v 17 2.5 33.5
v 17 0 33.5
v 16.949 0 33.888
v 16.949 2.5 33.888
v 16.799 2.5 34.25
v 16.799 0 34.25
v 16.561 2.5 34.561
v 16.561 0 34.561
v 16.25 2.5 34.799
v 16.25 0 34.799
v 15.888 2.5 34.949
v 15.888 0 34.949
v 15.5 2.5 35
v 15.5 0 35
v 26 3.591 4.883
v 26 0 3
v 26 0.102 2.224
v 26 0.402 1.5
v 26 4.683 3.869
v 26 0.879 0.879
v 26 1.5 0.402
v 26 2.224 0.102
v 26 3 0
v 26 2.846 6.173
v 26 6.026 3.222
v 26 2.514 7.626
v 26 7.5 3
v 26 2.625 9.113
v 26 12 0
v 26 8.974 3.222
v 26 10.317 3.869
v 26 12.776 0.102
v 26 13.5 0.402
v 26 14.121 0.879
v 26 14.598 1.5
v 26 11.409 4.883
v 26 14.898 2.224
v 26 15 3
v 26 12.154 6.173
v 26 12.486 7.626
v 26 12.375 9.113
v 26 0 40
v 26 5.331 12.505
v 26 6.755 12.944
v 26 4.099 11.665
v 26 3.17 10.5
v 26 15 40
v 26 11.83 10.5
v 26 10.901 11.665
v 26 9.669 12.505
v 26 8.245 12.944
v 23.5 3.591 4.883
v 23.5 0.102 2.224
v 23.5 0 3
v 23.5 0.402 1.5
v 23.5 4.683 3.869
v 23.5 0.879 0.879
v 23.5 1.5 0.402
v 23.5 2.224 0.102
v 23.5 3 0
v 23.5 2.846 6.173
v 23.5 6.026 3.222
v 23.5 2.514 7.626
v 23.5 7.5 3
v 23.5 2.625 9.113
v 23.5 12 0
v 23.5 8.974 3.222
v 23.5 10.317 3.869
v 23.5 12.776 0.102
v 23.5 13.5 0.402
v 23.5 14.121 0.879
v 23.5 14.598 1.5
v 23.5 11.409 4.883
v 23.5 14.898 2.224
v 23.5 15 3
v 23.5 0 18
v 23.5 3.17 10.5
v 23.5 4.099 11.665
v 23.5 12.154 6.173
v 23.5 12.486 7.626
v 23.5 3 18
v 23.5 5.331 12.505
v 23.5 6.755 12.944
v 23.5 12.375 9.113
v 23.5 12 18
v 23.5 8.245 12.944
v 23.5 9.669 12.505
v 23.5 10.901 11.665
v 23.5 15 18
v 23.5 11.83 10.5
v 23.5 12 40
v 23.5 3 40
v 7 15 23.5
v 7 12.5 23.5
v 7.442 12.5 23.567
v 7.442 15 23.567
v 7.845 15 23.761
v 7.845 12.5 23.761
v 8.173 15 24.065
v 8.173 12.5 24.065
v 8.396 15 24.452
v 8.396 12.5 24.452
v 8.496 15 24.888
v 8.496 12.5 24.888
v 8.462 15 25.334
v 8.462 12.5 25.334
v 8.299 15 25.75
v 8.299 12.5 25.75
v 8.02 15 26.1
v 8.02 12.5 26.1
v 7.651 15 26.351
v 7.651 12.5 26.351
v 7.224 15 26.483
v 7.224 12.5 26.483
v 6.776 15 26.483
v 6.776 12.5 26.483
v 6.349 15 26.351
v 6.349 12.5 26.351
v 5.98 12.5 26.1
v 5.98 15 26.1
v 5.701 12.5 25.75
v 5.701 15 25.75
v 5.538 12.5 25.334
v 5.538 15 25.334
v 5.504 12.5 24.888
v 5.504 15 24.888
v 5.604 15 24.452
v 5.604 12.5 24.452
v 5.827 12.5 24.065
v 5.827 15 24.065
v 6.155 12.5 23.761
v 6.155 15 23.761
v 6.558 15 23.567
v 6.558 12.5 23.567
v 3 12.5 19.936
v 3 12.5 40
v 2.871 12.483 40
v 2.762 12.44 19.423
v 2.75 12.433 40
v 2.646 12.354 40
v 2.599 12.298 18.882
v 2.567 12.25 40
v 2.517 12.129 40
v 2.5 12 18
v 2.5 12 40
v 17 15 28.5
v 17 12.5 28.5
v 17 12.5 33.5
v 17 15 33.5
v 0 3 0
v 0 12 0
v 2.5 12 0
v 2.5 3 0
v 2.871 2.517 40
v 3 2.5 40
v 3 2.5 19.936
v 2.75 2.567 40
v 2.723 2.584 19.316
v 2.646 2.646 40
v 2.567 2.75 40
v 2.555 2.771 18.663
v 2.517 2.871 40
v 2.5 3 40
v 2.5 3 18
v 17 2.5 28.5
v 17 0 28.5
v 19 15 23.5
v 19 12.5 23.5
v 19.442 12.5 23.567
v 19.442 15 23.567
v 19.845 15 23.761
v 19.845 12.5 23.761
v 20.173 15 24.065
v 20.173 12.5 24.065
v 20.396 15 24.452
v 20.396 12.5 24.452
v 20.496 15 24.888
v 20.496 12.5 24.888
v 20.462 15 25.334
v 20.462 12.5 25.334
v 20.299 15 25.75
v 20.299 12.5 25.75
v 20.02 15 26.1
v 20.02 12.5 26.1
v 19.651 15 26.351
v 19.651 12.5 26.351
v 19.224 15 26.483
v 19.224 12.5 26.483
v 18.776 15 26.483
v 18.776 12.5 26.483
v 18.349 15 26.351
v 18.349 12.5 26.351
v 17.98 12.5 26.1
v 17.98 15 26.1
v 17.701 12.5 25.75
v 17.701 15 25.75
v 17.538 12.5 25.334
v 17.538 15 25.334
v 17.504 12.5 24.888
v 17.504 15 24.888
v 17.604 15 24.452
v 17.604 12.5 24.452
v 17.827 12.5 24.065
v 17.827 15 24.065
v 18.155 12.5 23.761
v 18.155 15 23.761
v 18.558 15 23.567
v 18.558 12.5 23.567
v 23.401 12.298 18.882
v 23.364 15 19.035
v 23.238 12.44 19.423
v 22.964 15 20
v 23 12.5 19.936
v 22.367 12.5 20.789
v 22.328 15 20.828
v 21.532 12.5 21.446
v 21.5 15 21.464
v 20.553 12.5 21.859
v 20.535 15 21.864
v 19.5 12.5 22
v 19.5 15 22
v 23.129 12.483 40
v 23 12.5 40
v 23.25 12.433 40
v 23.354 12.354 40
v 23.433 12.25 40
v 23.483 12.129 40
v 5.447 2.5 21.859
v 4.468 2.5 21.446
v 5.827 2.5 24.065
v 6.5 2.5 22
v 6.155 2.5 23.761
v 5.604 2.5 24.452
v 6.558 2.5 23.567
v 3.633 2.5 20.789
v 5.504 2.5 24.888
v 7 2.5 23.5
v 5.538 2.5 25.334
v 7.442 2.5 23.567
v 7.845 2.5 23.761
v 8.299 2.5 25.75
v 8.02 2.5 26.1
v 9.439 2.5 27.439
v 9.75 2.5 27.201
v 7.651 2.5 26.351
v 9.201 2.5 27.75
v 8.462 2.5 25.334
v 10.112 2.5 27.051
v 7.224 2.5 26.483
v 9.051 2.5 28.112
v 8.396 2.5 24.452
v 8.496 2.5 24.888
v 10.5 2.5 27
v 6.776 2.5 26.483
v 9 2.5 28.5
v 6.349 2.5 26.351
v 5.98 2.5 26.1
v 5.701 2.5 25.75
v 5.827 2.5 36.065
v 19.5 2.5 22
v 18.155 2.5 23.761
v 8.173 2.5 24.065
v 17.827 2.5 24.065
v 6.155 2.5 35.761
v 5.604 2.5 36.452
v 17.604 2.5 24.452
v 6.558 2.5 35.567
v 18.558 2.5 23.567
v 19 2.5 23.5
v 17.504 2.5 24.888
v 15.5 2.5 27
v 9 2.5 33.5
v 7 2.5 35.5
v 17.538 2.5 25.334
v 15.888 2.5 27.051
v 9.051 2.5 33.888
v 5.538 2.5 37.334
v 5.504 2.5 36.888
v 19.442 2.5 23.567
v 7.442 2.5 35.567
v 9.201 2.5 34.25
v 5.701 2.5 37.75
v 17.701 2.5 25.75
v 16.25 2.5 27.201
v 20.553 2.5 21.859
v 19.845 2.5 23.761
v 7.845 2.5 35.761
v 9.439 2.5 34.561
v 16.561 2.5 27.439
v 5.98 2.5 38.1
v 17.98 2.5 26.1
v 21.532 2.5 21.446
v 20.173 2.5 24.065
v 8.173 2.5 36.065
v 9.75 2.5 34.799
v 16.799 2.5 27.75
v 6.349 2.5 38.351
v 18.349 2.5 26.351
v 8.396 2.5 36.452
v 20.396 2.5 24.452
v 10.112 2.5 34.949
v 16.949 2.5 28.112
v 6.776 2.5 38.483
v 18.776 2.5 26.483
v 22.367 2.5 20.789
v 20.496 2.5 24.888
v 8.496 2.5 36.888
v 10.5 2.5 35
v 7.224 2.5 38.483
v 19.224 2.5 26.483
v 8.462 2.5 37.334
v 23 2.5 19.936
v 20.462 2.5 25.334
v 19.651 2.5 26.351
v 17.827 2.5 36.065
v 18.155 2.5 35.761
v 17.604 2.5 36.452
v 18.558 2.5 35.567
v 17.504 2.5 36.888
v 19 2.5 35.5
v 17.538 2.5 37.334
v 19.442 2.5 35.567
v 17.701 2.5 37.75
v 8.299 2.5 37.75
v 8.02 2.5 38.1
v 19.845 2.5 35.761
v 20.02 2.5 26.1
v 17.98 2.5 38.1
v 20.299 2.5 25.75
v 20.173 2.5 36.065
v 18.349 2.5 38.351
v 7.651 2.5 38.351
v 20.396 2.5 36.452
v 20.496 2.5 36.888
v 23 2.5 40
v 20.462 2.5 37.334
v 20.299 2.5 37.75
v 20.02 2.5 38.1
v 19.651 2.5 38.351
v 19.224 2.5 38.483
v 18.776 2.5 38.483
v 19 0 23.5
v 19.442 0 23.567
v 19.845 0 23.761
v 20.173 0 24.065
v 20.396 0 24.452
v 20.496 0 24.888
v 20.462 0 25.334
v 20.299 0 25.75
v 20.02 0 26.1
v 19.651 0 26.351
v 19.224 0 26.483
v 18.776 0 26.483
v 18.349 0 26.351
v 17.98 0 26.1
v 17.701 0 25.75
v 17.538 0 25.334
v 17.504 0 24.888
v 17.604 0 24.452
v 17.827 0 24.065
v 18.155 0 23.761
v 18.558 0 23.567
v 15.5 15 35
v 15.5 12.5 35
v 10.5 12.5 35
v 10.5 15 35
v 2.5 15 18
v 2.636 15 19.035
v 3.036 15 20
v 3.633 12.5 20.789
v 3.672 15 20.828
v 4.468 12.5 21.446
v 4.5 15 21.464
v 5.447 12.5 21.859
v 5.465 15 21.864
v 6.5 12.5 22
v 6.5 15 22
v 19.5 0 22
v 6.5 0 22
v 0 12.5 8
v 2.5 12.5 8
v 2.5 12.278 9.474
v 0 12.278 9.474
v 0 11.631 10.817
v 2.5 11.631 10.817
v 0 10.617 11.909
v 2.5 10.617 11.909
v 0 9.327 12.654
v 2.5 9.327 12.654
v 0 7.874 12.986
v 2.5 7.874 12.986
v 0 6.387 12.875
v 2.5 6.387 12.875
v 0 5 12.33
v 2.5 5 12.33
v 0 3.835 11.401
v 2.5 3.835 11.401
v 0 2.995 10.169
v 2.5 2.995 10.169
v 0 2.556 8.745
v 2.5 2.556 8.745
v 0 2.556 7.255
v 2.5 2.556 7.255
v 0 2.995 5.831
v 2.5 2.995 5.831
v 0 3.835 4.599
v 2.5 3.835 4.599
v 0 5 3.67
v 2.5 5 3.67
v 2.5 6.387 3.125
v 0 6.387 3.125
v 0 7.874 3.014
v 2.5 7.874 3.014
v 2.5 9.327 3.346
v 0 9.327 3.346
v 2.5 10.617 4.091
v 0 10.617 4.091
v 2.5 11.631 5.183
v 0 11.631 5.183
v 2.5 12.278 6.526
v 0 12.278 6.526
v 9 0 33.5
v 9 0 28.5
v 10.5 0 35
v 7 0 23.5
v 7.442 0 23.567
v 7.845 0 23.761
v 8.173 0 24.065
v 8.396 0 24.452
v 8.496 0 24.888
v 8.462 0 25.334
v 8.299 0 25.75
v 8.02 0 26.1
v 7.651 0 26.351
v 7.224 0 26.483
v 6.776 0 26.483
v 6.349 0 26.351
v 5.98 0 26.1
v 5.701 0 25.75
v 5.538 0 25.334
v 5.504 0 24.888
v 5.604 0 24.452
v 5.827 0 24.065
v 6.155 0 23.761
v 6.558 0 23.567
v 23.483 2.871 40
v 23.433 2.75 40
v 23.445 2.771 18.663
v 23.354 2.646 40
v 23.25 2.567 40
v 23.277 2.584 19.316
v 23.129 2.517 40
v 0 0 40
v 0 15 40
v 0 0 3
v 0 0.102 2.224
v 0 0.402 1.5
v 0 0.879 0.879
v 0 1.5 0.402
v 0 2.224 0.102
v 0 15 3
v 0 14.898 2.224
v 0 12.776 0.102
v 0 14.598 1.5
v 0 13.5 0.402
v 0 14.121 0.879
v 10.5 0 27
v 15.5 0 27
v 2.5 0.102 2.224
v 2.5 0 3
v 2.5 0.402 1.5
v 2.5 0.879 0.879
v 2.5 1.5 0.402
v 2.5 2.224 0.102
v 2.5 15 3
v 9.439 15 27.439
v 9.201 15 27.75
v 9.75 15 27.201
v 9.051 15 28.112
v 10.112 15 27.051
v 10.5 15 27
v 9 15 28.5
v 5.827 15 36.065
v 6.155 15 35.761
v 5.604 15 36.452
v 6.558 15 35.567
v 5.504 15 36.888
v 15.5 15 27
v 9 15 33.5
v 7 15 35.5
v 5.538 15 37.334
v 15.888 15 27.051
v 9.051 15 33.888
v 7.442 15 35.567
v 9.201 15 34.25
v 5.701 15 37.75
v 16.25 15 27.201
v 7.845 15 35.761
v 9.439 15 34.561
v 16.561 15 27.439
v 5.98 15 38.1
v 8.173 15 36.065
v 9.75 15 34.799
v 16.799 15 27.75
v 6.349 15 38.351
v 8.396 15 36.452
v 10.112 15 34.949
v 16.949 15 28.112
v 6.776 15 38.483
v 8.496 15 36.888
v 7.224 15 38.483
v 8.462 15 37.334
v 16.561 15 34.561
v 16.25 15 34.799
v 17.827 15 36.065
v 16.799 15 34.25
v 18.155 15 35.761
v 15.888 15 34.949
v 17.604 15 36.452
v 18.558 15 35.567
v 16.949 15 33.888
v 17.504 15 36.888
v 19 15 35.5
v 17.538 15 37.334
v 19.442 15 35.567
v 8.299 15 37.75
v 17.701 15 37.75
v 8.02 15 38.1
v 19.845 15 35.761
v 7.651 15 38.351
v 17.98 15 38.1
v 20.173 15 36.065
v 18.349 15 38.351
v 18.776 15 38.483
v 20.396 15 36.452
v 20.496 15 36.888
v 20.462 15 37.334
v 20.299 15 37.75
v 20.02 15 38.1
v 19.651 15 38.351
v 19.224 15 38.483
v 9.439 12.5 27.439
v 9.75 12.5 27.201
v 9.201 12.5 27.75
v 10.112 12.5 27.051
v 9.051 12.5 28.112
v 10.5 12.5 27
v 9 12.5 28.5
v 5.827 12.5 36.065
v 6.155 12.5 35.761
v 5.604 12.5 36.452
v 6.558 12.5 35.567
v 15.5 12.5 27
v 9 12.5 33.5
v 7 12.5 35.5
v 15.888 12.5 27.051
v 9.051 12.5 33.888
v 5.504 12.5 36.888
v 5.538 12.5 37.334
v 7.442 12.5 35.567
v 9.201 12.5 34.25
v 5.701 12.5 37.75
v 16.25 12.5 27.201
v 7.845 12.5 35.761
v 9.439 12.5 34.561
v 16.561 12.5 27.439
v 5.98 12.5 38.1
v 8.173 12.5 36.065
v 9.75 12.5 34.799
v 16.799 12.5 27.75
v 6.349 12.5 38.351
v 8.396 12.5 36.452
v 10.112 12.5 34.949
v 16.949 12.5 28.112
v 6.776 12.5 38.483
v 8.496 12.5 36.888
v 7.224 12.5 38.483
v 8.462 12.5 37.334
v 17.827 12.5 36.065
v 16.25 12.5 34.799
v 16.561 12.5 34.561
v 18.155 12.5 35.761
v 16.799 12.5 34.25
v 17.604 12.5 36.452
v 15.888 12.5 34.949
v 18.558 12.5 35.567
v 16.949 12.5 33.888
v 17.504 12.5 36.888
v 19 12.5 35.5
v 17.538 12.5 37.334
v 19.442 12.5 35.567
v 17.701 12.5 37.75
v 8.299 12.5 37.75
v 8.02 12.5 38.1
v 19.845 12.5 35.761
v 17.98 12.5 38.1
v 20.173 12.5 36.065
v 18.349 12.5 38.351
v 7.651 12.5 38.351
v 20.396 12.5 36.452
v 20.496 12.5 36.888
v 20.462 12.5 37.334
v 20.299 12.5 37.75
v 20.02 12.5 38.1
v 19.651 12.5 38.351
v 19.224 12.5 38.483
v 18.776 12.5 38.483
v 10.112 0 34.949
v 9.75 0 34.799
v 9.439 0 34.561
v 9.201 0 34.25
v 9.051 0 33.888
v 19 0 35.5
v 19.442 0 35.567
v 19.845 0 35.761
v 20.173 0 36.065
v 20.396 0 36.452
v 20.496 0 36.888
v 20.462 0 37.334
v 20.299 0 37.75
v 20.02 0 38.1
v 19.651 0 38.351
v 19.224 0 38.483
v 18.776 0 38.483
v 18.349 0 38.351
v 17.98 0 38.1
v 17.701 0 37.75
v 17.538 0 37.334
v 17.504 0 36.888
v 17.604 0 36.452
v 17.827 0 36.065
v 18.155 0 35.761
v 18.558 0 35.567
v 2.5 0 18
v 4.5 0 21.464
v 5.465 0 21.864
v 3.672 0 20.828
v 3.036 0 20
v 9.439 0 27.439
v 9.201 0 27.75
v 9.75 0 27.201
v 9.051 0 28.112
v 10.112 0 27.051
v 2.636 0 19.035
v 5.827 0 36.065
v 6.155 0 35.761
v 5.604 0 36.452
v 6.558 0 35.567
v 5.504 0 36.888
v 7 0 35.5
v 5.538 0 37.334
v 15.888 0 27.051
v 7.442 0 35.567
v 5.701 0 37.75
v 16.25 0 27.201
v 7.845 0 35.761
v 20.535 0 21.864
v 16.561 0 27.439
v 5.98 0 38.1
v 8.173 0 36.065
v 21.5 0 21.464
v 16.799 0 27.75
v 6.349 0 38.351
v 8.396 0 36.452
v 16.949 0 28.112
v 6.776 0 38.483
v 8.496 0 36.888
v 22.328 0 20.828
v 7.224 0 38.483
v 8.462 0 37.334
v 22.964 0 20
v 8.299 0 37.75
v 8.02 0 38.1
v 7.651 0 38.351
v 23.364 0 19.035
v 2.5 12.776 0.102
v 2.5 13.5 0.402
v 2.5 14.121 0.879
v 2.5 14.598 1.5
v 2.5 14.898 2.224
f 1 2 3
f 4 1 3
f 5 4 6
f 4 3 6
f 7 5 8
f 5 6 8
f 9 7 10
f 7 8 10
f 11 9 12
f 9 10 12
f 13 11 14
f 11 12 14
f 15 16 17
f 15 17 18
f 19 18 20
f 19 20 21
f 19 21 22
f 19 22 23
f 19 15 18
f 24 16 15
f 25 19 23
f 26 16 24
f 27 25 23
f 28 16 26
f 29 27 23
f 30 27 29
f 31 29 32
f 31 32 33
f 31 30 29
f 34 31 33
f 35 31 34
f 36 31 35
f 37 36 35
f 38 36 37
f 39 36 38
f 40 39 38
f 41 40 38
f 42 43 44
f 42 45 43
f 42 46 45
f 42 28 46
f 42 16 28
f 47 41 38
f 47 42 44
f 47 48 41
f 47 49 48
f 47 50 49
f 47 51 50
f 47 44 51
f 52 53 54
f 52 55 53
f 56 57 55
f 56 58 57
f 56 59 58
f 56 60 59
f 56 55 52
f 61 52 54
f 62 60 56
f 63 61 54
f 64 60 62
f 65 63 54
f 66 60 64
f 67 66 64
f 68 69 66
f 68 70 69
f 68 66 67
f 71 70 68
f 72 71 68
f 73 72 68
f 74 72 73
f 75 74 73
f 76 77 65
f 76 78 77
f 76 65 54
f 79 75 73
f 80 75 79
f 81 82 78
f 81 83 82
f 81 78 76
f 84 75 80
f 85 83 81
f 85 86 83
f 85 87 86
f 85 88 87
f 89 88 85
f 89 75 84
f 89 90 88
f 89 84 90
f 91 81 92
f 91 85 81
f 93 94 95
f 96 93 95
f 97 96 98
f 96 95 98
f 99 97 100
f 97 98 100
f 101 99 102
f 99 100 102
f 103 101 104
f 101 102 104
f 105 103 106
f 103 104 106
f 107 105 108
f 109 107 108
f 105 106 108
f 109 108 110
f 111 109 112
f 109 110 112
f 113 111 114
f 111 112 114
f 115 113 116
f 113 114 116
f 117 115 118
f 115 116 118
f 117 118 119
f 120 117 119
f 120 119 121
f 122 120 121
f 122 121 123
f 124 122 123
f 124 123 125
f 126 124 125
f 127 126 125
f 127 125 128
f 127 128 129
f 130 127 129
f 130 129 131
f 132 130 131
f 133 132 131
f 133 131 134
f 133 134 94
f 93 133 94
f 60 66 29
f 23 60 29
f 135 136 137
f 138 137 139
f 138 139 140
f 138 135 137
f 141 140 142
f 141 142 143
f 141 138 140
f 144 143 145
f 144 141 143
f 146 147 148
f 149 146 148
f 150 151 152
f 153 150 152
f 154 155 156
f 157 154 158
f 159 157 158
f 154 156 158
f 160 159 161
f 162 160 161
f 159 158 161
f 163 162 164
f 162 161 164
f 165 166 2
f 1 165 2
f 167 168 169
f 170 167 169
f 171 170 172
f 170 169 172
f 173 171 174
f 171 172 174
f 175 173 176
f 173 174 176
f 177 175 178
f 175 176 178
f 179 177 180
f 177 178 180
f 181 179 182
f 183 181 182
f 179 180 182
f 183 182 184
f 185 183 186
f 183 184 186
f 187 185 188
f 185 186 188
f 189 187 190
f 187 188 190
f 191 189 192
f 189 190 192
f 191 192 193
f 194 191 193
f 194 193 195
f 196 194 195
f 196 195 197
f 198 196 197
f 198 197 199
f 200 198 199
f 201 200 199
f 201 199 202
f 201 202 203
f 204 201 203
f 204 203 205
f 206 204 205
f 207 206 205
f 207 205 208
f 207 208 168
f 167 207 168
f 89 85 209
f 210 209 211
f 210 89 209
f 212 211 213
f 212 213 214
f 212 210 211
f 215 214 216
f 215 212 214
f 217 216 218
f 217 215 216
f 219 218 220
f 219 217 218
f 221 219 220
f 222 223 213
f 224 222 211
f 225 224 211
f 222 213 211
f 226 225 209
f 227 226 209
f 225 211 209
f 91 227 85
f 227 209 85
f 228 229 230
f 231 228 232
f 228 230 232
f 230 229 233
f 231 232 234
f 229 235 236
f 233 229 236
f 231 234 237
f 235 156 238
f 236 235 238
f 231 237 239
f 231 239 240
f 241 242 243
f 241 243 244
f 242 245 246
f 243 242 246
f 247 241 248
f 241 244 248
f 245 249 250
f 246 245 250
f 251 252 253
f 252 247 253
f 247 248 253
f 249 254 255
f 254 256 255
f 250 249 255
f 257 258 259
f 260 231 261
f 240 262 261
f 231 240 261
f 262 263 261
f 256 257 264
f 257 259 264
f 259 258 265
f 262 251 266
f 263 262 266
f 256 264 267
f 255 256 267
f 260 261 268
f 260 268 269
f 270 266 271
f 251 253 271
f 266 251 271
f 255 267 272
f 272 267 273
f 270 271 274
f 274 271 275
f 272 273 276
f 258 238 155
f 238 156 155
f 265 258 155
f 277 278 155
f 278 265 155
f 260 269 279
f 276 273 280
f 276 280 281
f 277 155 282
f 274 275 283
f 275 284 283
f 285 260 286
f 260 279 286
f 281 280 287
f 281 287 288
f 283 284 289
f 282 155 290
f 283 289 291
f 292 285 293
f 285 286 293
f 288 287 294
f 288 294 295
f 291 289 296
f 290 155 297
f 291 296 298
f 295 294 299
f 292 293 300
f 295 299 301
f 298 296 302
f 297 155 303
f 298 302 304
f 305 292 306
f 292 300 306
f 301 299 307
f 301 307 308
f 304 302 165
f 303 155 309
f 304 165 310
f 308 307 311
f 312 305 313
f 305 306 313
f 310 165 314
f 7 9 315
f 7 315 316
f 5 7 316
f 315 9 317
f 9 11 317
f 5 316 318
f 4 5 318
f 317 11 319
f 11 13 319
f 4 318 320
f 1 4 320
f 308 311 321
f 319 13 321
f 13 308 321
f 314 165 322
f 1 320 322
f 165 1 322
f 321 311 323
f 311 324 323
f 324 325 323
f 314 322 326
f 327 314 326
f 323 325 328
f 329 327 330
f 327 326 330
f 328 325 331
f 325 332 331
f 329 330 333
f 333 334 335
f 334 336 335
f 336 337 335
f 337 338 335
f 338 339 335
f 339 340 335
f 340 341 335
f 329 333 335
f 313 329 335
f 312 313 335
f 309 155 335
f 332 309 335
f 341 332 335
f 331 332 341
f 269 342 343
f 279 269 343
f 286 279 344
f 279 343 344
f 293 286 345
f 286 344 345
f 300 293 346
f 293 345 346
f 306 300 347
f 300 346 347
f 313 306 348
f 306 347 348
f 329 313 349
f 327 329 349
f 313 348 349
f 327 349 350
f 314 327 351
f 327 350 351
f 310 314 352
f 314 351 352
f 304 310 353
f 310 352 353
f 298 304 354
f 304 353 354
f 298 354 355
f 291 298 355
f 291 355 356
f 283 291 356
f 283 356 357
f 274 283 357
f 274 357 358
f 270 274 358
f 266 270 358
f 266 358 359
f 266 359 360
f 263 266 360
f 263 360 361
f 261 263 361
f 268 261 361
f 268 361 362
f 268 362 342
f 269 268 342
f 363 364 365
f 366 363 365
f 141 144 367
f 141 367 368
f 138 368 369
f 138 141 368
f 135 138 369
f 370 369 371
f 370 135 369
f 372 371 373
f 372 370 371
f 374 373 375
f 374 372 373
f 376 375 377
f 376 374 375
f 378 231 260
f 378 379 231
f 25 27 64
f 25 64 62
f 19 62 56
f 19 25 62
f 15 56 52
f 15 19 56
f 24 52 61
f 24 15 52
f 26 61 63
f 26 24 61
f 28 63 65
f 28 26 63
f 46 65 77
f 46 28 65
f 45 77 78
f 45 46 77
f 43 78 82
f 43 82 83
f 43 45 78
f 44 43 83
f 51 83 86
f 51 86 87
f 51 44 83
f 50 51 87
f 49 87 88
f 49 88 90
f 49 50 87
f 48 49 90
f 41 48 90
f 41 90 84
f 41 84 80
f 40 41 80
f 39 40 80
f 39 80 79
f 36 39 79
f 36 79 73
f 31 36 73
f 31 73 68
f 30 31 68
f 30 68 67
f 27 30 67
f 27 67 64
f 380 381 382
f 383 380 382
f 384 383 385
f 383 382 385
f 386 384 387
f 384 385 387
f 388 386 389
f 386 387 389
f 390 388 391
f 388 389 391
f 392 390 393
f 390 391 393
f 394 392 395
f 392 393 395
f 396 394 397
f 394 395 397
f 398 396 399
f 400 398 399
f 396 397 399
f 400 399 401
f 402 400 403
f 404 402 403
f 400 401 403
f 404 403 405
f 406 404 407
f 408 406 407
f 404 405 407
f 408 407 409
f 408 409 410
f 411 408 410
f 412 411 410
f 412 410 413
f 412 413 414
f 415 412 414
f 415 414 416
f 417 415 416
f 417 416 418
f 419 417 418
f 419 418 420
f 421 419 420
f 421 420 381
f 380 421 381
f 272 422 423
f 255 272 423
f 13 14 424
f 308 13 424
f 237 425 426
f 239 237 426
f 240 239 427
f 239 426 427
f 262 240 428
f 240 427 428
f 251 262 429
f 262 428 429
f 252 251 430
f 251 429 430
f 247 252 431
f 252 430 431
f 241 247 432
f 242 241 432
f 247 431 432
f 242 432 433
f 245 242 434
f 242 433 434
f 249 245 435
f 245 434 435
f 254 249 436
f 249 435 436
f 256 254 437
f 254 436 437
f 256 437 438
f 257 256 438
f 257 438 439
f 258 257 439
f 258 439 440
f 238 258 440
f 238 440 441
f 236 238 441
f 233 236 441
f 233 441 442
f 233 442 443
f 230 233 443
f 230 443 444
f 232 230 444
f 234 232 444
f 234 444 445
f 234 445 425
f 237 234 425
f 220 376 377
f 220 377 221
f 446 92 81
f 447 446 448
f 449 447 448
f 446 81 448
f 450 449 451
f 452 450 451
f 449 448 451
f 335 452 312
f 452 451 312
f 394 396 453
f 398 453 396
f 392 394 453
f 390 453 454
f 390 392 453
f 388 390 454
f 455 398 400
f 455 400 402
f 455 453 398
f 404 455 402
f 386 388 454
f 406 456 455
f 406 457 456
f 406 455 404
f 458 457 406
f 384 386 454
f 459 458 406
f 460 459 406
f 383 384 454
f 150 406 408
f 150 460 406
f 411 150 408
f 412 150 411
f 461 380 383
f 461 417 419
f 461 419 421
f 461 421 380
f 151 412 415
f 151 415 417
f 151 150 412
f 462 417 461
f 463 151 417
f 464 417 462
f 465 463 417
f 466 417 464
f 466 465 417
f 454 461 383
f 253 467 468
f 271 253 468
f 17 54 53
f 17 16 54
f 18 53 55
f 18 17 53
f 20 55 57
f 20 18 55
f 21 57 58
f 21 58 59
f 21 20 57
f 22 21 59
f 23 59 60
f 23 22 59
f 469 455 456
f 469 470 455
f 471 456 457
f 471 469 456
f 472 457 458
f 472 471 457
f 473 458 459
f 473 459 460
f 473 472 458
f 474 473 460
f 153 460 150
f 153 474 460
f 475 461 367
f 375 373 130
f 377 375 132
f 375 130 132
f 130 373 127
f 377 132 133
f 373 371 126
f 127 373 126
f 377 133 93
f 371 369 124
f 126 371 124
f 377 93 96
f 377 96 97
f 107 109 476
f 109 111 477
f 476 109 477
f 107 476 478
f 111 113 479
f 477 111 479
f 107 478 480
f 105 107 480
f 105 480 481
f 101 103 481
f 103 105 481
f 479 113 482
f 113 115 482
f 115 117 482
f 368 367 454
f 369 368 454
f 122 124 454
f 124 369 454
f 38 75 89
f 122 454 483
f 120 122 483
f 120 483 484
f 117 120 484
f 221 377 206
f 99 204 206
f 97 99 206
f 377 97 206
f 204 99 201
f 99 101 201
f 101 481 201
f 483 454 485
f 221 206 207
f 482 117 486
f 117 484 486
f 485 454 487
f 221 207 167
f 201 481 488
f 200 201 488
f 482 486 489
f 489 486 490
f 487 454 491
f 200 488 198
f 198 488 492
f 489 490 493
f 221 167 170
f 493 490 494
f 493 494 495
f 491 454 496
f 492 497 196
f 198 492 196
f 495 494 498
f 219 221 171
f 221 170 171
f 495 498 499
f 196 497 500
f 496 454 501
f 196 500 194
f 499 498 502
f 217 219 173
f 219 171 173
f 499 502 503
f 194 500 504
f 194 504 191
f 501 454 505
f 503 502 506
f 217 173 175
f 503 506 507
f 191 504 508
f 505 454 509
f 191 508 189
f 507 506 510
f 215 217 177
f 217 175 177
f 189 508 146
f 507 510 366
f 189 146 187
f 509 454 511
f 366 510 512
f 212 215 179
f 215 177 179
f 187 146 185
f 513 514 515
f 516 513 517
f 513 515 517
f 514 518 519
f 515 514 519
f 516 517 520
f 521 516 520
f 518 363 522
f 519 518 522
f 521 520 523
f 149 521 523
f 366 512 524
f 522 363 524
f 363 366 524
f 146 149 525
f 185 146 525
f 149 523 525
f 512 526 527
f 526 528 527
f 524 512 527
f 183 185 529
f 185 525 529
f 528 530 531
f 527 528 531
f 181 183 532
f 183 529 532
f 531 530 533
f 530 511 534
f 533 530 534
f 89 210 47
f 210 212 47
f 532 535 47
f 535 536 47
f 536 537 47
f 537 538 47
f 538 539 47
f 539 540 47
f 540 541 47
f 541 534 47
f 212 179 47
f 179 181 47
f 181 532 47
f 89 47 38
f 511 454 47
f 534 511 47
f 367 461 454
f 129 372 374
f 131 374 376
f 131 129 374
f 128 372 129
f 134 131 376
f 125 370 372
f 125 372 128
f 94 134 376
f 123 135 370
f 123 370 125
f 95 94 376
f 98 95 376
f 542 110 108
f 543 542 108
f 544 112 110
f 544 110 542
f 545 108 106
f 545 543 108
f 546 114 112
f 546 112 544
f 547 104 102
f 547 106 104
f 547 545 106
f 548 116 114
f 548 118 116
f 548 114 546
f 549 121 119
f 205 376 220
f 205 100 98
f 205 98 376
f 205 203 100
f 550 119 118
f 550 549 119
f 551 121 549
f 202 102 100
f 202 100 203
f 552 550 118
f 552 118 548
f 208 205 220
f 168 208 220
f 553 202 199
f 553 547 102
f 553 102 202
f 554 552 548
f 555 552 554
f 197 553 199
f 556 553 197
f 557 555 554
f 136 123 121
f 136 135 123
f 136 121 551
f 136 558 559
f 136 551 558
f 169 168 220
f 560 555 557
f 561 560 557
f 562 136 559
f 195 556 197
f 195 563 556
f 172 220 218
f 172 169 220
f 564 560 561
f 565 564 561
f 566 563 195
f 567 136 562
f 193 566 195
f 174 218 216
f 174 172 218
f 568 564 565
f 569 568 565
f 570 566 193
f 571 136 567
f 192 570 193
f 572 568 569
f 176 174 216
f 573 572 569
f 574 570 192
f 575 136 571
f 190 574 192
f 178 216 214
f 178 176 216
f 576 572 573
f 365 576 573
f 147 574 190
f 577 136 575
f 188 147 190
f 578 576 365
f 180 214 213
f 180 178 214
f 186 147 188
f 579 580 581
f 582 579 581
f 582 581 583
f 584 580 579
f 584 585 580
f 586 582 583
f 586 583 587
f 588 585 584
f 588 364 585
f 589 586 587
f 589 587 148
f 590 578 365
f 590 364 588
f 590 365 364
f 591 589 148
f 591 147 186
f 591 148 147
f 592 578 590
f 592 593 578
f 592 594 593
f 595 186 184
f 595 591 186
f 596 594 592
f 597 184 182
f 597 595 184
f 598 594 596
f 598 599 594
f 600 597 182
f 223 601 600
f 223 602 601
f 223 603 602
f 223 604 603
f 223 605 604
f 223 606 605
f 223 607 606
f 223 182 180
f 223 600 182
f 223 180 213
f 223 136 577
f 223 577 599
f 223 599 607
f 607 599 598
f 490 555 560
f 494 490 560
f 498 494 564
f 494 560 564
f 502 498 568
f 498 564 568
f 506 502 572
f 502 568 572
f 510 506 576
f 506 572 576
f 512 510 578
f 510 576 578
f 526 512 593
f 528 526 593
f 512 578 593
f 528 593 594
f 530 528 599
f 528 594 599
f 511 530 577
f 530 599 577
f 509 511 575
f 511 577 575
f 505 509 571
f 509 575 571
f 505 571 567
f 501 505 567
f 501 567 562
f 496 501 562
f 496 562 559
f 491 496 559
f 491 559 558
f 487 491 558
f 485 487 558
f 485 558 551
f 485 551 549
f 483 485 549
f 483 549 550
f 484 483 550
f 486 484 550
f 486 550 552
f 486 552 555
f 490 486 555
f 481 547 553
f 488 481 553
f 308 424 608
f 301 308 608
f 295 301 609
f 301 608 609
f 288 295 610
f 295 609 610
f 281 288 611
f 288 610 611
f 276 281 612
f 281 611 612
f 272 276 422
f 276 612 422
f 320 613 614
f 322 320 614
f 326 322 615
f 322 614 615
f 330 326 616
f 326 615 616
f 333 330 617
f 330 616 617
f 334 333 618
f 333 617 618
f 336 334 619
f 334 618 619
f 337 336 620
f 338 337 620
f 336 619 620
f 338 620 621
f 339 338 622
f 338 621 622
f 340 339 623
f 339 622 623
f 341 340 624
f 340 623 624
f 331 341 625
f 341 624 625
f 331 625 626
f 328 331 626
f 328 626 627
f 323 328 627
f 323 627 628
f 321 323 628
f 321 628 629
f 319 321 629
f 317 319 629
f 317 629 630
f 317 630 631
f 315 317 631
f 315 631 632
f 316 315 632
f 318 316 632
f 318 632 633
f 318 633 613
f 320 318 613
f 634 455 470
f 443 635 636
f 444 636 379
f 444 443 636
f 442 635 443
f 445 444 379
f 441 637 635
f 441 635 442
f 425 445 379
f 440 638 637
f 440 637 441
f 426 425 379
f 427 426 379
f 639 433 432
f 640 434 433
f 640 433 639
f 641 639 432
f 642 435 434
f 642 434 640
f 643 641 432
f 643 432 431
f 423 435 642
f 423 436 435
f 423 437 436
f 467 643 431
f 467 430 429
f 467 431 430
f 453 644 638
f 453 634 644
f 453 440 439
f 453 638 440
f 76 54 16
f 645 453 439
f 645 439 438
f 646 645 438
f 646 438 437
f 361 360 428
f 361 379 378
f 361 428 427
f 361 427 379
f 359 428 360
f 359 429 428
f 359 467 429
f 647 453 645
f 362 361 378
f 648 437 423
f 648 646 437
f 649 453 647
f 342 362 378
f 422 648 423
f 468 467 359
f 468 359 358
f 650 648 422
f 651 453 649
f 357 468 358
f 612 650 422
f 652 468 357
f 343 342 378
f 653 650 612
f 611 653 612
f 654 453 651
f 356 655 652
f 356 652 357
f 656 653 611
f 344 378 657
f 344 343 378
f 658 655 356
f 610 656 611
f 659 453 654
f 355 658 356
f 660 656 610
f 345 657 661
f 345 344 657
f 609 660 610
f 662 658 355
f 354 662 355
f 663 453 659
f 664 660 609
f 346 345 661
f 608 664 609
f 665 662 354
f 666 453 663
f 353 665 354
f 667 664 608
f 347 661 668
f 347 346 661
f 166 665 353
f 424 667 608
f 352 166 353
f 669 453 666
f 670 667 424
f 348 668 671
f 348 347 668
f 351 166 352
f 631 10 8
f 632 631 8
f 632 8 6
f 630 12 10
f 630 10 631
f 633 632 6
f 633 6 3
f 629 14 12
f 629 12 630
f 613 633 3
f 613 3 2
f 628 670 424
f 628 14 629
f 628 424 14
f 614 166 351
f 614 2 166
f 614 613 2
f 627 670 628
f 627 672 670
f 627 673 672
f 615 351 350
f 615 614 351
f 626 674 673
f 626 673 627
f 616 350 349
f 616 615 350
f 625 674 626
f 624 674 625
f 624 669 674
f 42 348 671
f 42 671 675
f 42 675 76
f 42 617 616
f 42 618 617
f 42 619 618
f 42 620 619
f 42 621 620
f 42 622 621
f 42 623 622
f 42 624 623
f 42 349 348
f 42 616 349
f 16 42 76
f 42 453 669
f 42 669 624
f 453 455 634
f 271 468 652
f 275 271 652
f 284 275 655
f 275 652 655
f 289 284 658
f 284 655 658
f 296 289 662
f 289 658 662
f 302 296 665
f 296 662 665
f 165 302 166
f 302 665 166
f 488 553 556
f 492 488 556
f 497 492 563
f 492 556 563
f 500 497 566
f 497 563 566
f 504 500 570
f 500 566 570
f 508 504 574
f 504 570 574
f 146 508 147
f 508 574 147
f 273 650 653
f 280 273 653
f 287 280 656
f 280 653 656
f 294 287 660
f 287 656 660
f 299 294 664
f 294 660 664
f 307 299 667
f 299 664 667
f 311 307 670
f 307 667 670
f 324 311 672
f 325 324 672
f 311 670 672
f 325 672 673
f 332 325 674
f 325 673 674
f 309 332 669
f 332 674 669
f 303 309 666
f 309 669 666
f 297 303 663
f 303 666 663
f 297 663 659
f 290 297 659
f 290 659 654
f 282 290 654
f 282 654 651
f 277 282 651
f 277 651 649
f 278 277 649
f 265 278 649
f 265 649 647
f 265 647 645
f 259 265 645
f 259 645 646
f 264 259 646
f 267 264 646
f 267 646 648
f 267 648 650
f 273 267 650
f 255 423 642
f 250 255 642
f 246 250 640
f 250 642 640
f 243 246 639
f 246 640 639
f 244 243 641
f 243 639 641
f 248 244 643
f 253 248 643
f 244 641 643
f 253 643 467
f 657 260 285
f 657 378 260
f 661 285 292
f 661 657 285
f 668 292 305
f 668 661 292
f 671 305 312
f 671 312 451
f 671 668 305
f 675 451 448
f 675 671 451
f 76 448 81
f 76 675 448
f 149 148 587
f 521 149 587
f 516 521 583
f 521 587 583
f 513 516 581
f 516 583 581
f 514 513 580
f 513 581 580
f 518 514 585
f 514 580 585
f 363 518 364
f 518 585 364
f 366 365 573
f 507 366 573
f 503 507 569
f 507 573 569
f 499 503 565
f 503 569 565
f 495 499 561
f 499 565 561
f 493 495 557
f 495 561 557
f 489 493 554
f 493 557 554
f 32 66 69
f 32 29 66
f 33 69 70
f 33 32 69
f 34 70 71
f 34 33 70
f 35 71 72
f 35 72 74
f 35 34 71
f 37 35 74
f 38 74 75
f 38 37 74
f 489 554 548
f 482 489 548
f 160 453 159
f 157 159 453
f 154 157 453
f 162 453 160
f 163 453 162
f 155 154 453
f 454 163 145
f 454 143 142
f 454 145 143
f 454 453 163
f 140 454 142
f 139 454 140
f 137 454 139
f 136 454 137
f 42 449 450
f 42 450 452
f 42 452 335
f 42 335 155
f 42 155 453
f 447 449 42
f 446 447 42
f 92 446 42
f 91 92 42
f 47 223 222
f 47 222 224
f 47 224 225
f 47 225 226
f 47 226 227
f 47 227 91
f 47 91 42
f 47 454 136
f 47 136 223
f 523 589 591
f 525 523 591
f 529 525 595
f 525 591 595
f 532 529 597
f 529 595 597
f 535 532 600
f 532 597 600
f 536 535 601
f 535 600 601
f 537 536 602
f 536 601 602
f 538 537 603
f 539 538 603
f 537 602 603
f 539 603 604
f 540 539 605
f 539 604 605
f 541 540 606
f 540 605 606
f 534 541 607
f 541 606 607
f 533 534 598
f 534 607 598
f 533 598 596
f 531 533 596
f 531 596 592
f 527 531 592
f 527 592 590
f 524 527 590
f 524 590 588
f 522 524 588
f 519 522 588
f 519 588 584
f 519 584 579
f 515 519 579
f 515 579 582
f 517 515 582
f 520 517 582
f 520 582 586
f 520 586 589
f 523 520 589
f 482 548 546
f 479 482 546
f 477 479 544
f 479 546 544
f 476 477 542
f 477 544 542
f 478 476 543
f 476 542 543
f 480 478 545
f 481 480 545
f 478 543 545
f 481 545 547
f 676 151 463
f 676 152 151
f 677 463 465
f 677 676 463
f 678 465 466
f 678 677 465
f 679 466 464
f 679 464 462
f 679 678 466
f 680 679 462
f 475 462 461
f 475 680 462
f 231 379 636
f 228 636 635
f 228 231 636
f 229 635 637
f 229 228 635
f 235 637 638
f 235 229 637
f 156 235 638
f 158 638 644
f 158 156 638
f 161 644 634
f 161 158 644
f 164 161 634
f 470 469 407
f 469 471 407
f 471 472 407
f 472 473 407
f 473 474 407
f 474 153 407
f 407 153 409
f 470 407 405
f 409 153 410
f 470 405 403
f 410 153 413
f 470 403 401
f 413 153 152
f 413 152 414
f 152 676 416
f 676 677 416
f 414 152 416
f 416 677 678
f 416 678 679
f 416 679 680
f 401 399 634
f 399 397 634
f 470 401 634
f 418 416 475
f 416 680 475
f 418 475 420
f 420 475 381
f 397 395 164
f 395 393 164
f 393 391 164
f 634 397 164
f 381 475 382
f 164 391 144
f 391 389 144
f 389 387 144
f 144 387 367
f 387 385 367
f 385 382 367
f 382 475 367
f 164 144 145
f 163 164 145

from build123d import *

# Parameters (mm, degrees)
SKETCH_1_W               = 23
SKETCH_1_H               = 15
EXTRUDE_1_DEPTH          = 40
SKETCH_2_W               = 20
SKETCH_2_H               = 10
CUT_EXTRUDE_2_DEPTH      = 68
SKETCH_5_W               = 20
SKETCH_5_H               = 22
CUT_EXTRUDE_5_DEPTH      = 20
SKETCH_6_R               = 5
CUT_EXTRUDE_6_DEPTH      = 20
SKETCH_7_R               = 1.5
CUT_EXTRUDE_7_DEPTH      = 20
SKETCH_8_W               = 3
SKETCH_8_H               = 15
EXTRUDE_2_DEPTH          = 40
SKETCH_9_W               = 21
SKETCH_9_H               = 10
CUT_EXTRUDE_8_DEPTH      = 100
CUT_EXTRUDE_9_DEPTH      = 20.5
CUT_EXTRUDE_9_DEPTH_BACK = 0.5
SKETCH_10_W              = 22
SKETCH_10_H              = 2.5
FILLET_4_R               = 0.5
CUT_EXTRUDE_START        = -4.5
SKETCH_11_R              = 5
CUT_EXTRUDE_10_DEPTH     = 4.5
FILLET_5_R               = 4
FILLET_6_R               = 3


with BuildPart() as part:
    # 草图1 → 凸台-拉伸1 (new body)
    with BuildSketch(Plane.XY):
        with Locations((11.5, 7.5)):
            Rectangle(SKETCH_1_W, SKETCH_1_H)
    extrude(amount=EXTRUDE_1_DEPTH)

    # 草图2 → 切除-拉伸2 (cut)
    with BuildSketch(Plane.XY.offset(40)):
        with Locations((13, 7.5)):
            Rectangle(SKETCH_2_W, SKETCH_2_H)
    extrude(amount=-CUT_EXTRUDE_2_DEPTH, mode=Mode.SUBTRACT)

    # 草图5 → 切除-拉伸5 (cut)
    with BuildSketch(Plane.XZ):
        with Locations((13, 11)):
            Rectangle(SKETCH_5_W, SKETCH_5_H)
    extrude(amount=-CUT_EXTRUDE_5_DEPTH, mode=Mode.SUBTRACT)

    # 草图6 → 切除-拉伸6 (cut)
    with BuildSketch(Plane(origin=(3, 0, 0), x_dir=(0, 0, -1), z_dir=(1, 0, 0))):
        with Locations(Location((-8, 7.5, 0), (0, 0, 90))):
            Circle(SKETCH_6_R)
    extrude(amount=-CUT_EXTRUDE_6_DEPTH, mode=Mode.SUBTRACT)

    # 草图7 → 切除-拉伸7 (cut)
    with BuildSketch(Plane.XZ):
        with Locations(Location((7, 37, 0), (0, 0, 270))):
            Circle(SKETCH_7_R)
        with Locations(Location((19, 37, 0), (0, 0, 270))):
            Circle(SKETCH_7_R)
        with Locations(Location((7, 25, 0), (0, 0, 270))):
            Circle(SKETCH_7_R)
        with Locations(Location((19, 25, 0), (0, 0, 270))):
            Circle(SKETCH_7_R)
        with BuildLine():
            Line((10.5, 27), (15.5, 27))
            ThreePointArc((15.5, 27), (16.560660172, 27.439339828), (17, 28.5))
            Line((17, 28.5), (17, 33.5))
            ThreePointArc((17, 33.5), (16.560660172, 34.560660172), (15.5, 35))
            Line((15.5, 35), (10.5, 35))
            ThreePointArc((10.5, 35), (9.439339828, 34.560660172), (9, 33.5))
            Line((9, 33.5), (9, 28.5))
            ThreePointArc((9, 28.5), (9.439339828, 27.439339828), (10.5, 27))
        make_face()
    extrude(amount=-CUT_EXTRUDE_7_DEPTH, mode=Mode.SUBTRACT)

    # 草图8 → 凸台-拉伸2 (add)
    with BuildSketch(Plane.XY.offset(40)):
        with Locations((24.5, 7.5)):
            Rectangle(SKETCH_8_W, SKETCH_8_H)
    extrude(amount=-EXTRUDE_2_DEPTH)

    # 草图9 → 切除-拉伸8 (cut)
    with BuildSketch(Plane.XY.offset(40)):
        with Locations((13, 7.5)):
            Rectangle(SKETCH_9_W, SKETCH_9_H)
    extrude(amount=-CUT_EXTRUDE_8_DEPTH, mode=Mode.SUBTRACT)

    # 草图10 → 切除-拉伸9 (cut, two sides: drawn at the far end of the back side and taken through both)
    with BuildSketch(Plane.ZY.offset(-23).offset(-CUT_EXTRUDE_9_DEPTH_BACK)):
        with Locations((11, 13.75)):
            Rectangle(SKETCH_10_W, SKETCH_10_H)
        with Locations((11, 1.25)):
            Rectangle(SKETCH_10_W, SKETCH_10_H)
    extrude(amount=CUT_EXTRUDE_9_DEPTH + CUT_EXTRUDE_9_DEPTH_BACK, mode=Mode.SUBTRACT)

    # 圆角4
    fillet_4_edges = [part.edges().sort_by_distance(p)[0] for p in [
        (2.5, 12.5, 31),
        (2.5, 2.5, 31),
        (23.5, 2.5, 31),
        (23.5, 12.5, 31),
    ]]
    fillet(fillet_4_edges, radius=FILLET_4_R)

    # 草图11 → 切除-拉伸10 (cut)
    with BuildSketch(Plane.ZY.offset(-23.5).offset(CUT_EXTRUDE_START)):
        with Locations(Location((8, 7.5, 0), (0, 0, 180))):
            Circle(SKETCH_11_R)
    extrude(amount=CUT_EXTRUDE_10_DEPTH, mode=Mode.SUBTRACT)

    # 圆角5
    fillet_5_edges = [part.edges().sort_by_distance(p)[0] for p in [
        (23.5, 13.5, 22),
        (23.5, 1.5, 22),
        (2.5, 13.5, 22),
        (2.5, 1.5, 22),
    ]]
    fillet(fillet_5_edges, radius=FILLET_5_R)

    # 圆角6
    fillet_6_edges = [part.edges().sort_by_distance(p)[0] for p in [
        (24.75, 15, 0),
        (24.75, 0, 0),
        (1.25, 15, 0),
        (1.25, 0, 0),
    ]]
    fillet(fillet_6_edges, radius=FILLET_6_R)


solid = part.part
